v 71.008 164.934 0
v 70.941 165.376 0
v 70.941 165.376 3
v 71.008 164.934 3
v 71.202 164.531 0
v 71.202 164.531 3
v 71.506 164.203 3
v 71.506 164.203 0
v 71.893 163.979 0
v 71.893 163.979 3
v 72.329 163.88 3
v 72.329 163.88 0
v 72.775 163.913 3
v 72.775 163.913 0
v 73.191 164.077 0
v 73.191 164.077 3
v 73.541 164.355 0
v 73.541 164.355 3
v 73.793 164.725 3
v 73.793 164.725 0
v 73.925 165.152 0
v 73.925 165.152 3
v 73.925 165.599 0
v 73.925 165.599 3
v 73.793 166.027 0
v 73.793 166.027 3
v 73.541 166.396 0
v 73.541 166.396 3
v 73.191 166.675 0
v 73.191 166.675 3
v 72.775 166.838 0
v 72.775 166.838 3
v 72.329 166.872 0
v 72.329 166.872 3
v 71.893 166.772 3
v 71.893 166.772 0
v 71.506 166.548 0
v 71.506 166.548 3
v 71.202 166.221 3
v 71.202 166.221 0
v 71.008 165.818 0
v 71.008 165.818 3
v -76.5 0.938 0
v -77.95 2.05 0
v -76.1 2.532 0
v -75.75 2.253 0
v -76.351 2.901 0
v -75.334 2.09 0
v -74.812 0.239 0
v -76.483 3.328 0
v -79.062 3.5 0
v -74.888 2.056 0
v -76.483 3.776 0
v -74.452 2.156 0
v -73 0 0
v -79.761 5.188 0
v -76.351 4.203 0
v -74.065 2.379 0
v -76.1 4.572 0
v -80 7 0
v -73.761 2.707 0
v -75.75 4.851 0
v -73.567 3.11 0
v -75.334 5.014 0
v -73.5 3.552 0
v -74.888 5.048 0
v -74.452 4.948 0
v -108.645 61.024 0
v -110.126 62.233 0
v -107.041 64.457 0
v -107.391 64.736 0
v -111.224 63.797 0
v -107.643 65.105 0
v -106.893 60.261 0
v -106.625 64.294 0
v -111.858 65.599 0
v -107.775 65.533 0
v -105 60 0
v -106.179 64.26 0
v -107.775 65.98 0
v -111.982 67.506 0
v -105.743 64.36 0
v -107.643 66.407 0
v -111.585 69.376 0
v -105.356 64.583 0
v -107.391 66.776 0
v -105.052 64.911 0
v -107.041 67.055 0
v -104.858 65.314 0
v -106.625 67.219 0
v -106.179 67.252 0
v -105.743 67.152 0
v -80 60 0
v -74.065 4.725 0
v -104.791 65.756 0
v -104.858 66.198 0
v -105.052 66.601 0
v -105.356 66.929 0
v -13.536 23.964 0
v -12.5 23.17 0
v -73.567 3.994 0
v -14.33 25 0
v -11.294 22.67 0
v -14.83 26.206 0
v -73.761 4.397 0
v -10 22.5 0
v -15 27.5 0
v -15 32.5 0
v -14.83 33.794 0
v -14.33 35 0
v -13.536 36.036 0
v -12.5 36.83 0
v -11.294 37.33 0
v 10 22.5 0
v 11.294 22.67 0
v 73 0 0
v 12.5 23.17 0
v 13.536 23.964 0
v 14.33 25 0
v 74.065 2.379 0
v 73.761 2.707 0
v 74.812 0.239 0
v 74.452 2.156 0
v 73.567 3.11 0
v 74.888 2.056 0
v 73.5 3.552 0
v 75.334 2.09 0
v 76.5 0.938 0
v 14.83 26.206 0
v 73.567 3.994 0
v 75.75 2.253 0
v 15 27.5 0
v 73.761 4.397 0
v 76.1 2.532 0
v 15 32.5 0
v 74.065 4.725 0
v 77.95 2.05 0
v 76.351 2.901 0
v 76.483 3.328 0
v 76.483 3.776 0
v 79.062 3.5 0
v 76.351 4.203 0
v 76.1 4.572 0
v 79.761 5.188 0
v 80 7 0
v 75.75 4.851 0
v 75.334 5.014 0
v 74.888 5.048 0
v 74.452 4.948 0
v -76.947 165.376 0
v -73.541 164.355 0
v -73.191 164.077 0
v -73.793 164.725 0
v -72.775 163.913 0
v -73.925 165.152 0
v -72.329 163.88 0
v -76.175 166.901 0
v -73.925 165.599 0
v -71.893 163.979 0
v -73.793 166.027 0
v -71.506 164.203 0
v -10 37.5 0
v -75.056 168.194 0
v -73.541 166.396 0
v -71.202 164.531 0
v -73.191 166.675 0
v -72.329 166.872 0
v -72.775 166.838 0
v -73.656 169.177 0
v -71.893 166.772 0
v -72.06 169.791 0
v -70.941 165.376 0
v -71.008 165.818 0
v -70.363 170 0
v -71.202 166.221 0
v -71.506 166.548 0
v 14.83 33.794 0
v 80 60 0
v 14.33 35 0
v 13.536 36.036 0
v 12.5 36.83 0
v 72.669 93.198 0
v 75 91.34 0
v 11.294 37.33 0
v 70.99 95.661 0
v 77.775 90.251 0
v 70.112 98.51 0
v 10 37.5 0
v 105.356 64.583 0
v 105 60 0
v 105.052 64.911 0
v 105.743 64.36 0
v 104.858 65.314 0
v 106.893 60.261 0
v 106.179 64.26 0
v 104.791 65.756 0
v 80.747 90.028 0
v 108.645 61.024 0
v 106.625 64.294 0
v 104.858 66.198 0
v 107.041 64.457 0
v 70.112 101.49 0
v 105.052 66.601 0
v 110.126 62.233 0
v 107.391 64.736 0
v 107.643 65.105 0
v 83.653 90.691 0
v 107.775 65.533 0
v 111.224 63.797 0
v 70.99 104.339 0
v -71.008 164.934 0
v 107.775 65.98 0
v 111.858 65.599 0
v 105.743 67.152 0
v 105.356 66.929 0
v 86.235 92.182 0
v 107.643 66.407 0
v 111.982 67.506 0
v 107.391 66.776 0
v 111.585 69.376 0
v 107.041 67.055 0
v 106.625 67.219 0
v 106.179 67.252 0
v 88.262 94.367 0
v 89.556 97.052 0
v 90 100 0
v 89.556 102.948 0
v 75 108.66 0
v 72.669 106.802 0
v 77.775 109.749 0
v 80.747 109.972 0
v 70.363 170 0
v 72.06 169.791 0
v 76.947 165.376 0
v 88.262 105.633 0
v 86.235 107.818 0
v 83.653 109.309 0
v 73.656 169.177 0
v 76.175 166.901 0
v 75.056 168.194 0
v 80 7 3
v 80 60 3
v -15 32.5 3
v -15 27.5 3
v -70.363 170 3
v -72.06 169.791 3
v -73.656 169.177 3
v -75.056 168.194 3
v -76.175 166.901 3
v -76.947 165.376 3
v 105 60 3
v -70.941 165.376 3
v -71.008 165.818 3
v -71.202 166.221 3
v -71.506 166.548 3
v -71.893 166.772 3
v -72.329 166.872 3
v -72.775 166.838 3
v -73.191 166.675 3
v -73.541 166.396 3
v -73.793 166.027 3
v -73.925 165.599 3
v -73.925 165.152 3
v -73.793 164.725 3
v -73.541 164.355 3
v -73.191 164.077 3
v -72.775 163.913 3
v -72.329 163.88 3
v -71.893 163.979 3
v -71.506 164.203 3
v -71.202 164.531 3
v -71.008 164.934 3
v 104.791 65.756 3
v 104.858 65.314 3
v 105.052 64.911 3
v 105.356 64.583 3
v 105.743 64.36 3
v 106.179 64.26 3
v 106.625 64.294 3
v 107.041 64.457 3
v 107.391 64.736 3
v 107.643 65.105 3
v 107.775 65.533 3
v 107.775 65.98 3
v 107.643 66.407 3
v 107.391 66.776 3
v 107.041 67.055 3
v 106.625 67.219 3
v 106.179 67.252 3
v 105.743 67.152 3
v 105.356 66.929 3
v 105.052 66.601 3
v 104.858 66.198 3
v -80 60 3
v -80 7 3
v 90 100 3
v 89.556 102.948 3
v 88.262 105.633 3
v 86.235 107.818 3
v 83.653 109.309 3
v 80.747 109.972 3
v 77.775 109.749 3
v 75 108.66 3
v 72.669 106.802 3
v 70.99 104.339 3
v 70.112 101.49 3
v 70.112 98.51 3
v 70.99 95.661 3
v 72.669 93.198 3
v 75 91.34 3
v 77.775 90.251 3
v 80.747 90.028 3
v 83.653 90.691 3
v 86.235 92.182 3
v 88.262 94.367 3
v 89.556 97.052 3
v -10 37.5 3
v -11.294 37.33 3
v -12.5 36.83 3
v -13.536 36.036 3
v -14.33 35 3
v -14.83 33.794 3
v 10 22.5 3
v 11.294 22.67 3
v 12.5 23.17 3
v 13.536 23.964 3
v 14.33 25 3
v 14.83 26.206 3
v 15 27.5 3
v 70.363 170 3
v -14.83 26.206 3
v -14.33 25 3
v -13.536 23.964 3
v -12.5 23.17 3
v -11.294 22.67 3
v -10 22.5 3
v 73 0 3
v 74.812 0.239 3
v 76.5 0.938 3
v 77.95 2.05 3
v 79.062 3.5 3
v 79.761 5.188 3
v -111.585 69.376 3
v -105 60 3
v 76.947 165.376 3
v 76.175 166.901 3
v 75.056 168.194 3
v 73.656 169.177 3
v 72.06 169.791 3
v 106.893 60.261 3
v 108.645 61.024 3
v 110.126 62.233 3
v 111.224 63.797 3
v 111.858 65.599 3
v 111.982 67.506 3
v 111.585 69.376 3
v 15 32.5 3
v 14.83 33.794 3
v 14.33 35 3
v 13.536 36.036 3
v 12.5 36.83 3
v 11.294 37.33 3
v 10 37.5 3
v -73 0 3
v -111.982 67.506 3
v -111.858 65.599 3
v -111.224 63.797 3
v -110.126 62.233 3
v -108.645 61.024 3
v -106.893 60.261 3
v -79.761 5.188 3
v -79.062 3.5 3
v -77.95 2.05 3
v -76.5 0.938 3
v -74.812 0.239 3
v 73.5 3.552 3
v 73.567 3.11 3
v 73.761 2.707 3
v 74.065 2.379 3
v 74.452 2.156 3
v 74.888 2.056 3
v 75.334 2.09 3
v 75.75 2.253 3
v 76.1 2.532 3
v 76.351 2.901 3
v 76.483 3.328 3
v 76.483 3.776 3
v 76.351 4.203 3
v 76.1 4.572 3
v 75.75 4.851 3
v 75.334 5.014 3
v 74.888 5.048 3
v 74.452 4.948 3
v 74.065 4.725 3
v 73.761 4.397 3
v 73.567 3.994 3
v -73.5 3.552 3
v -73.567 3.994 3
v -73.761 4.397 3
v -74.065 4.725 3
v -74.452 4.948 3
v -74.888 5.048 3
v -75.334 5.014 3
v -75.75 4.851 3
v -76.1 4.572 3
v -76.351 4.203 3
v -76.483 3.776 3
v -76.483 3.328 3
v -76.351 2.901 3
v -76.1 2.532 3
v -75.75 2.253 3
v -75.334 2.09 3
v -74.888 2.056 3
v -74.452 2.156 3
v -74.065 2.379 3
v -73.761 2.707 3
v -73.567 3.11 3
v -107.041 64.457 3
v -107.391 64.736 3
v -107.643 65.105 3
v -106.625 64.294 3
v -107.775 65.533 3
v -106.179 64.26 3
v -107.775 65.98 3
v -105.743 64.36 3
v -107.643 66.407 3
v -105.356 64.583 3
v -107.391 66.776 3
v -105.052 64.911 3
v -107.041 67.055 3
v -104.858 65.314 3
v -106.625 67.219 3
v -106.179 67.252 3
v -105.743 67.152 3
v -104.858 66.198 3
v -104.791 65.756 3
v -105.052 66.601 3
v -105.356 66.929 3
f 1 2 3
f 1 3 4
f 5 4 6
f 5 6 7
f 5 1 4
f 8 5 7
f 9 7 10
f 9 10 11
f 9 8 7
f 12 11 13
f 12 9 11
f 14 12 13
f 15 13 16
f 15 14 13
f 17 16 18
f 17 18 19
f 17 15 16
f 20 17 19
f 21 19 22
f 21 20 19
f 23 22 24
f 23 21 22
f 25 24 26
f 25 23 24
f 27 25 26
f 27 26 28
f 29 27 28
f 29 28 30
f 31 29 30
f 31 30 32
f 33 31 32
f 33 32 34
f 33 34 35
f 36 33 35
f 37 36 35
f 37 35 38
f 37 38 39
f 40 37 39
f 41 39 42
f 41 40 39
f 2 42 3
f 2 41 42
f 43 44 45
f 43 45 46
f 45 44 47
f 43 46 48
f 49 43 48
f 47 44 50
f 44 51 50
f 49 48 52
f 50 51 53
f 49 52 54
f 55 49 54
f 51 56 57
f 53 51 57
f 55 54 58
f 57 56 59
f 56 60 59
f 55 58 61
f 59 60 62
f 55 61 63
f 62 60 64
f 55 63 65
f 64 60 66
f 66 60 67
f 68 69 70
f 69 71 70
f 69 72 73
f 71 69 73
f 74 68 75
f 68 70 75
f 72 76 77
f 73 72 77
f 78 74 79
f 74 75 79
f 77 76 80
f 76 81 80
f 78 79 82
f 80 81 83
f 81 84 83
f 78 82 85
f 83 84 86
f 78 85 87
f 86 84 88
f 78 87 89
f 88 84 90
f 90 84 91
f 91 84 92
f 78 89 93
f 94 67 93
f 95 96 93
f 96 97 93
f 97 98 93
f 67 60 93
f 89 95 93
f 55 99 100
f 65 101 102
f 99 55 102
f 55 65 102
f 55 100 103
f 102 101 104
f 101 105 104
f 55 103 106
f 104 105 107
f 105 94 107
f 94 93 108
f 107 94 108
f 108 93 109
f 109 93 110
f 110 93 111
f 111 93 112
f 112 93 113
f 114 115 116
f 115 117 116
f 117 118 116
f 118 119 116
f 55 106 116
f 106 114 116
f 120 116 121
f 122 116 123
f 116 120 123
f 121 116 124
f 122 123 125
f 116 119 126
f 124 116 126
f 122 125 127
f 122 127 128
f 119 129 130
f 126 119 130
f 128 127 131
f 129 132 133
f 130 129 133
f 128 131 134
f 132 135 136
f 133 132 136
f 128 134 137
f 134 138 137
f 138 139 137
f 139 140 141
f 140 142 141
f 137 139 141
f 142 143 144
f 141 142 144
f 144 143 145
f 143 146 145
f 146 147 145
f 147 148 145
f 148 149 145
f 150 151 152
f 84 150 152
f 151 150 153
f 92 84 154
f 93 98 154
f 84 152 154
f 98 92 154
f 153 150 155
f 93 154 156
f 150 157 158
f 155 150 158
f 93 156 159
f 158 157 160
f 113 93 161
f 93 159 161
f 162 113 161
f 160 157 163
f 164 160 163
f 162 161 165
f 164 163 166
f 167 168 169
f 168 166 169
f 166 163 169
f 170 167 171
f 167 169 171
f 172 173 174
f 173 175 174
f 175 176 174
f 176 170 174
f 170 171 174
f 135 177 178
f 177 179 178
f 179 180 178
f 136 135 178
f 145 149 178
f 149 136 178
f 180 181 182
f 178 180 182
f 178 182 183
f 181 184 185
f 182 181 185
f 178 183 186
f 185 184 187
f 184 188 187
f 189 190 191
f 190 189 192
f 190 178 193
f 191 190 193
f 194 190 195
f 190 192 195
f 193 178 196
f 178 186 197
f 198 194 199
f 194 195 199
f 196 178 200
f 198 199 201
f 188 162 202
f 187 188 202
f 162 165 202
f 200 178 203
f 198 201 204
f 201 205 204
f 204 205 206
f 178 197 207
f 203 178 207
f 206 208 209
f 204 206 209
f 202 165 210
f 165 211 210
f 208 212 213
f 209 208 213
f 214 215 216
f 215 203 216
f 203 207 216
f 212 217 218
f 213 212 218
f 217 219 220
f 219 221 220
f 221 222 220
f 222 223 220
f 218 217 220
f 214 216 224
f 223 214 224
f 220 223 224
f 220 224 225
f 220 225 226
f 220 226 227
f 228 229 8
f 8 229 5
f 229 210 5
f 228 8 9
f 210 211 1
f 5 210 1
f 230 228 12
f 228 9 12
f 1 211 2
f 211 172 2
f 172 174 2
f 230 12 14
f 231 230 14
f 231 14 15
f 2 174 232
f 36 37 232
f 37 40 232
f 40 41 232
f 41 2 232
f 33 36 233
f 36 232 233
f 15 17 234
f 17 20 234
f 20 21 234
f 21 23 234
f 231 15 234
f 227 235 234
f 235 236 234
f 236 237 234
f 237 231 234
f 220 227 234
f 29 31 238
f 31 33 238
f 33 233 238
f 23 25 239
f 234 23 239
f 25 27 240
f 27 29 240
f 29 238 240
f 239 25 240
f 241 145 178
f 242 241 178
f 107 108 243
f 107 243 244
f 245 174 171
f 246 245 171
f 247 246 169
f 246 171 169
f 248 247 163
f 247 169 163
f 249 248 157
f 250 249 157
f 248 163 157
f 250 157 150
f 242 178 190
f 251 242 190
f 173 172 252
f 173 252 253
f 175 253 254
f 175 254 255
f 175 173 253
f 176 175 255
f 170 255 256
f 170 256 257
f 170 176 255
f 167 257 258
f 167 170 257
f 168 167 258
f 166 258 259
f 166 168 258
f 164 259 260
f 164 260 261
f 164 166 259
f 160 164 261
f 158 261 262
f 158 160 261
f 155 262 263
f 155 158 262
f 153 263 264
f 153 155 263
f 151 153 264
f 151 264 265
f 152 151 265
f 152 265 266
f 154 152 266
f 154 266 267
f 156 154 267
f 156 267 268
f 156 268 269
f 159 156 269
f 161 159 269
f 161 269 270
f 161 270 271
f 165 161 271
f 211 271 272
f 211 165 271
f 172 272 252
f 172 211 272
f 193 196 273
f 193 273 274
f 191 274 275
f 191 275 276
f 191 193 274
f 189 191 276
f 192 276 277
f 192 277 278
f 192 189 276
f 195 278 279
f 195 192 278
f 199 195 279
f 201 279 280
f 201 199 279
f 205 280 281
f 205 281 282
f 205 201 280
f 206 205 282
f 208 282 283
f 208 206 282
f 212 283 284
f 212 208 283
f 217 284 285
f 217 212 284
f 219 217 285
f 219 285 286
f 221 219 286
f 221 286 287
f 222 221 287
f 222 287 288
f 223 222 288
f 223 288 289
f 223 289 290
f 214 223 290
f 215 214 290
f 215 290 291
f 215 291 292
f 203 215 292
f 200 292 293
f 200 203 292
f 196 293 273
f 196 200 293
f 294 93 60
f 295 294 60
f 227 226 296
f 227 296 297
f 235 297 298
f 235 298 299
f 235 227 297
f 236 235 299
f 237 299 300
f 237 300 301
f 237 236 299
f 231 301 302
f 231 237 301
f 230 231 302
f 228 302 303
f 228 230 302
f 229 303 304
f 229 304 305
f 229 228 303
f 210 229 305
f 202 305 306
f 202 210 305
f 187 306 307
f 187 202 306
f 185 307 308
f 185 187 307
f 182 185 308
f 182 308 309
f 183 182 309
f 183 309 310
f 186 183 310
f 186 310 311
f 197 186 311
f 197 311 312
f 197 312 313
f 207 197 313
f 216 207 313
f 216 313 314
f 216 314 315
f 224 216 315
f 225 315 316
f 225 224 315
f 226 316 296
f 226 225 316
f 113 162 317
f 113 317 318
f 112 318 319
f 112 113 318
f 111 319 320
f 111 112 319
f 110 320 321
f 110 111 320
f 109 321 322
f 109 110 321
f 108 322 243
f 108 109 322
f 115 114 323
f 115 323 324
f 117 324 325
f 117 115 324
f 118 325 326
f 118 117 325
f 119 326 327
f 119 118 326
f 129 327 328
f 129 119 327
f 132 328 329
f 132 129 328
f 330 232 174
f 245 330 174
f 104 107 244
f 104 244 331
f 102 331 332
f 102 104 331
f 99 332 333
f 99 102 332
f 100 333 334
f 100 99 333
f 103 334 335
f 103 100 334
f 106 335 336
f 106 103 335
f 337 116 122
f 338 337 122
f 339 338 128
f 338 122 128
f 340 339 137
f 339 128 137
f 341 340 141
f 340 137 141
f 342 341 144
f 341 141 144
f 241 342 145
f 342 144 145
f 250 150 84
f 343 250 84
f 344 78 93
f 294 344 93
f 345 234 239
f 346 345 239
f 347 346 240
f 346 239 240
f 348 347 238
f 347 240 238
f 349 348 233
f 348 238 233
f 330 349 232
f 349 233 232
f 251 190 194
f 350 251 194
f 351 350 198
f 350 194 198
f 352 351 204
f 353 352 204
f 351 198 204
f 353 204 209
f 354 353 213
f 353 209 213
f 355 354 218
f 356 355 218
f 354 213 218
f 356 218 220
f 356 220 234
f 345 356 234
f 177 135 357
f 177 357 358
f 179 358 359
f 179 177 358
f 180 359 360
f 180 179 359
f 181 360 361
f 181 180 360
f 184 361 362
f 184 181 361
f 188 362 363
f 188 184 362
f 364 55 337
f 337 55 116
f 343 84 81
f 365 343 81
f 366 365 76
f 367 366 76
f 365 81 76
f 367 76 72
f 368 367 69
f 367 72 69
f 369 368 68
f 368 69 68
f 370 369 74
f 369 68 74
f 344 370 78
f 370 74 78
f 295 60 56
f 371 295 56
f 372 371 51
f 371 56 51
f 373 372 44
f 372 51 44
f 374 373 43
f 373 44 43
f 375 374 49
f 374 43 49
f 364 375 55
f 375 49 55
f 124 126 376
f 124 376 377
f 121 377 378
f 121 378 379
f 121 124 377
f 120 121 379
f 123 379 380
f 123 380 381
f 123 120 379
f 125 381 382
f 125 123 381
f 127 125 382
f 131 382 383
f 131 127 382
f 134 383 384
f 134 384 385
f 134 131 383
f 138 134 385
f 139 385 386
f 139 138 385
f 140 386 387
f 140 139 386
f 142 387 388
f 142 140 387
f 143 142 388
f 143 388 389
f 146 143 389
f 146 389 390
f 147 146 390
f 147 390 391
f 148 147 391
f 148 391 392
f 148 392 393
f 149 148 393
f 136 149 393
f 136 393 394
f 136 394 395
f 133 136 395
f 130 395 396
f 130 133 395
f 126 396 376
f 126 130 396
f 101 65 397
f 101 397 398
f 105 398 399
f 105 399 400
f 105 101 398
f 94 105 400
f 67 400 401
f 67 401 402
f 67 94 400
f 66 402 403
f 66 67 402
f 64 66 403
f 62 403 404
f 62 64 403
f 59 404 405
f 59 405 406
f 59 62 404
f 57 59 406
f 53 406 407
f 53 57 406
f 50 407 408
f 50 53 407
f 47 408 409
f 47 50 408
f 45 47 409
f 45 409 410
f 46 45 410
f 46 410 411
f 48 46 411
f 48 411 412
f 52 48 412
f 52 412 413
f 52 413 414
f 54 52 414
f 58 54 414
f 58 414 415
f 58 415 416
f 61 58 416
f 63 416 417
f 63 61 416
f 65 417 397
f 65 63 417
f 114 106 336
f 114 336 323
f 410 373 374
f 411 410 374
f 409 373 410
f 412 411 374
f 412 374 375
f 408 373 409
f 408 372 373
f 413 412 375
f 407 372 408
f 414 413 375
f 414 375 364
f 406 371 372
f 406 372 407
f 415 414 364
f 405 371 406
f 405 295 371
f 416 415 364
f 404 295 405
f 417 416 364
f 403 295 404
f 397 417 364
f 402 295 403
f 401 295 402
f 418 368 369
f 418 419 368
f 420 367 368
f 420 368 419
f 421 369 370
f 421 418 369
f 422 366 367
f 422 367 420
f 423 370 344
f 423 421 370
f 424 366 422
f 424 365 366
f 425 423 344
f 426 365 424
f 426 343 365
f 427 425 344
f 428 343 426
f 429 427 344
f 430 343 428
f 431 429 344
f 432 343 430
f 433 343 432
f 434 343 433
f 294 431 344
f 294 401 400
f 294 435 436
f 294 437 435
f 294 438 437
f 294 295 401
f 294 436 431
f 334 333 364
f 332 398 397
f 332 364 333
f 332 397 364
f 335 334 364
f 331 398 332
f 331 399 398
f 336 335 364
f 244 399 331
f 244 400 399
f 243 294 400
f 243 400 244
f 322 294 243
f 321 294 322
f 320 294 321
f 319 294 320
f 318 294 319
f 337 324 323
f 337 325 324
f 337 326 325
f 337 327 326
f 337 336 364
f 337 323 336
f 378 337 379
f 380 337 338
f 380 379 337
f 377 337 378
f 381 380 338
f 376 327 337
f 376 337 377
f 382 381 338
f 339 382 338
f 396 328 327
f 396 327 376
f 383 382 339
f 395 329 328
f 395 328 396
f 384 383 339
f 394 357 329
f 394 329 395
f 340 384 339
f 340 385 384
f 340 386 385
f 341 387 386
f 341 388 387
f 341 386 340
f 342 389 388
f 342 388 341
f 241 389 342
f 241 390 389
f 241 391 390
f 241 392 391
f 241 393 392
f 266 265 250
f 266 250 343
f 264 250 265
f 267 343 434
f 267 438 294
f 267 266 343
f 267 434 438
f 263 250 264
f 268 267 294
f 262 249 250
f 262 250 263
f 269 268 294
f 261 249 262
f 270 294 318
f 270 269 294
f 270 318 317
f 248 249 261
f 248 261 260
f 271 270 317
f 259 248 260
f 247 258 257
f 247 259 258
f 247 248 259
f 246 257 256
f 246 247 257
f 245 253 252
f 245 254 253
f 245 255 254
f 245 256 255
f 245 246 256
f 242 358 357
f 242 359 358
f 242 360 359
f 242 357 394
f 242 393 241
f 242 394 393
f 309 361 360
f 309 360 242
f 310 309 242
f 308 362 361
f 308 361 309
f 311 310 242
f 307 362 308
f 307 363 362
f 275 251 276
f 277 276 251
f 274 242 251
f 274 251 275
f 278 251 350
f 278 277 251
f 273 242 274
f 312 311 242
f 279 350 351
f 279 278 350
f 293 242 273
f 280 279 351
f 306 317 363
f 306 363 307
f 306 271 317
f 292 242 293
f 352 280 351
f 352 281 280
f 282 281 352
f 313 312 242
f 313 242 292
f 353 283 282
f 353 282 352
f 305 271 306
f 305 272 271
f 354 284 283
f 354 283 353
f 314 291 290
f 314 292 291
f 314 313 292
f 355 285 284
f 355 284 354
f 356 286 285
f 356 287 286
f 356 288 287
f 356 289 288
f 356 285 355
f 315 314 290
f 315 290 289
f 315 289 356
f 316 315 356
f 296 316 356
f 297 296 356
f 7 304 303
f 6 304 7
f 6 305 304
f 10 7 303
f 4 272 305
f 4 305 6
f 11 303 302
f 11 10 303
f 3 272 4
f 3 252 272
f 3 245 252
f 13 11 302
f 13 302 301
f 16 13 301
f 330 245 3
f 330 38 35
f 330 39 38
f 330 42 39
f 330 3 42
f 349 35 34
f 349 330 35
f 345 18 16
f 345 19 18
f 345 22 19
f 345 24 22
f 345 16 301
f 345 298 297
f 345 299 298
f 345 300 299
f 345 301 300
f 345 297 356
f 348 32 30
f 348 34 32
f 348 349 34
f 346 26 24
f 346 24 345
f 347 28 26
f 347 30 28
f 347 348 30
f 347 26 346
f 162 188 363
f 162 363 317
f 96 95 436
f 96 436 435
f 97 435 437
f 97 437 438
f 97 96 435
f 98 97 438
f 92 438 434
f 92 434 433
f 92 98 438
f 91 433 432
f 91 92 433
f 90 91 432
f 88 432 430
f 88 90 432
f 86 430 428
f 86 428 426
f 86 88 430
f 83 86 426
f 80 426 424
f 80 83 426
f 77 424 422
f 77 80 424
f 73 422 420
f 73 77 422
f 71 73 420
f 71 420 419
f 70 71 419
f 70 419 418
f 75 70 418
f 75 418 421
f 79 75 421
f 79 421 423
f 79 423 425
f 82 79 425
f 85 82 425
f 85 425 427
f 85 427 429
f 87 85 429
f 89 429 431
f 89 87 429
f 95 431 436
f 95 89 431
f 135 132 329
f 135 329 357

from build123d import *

# Parameters (mm, degrees)
SKETCH_2_R      = 10
SKETCH_2_R_2    = 1.5
EXTRUDE_2_DEPTH = 3


with BuildPart() as part:
    # 草图2 → 凸台-拉伸2 (new body)
    with BuildSketch(Plane.XY):
        with BuildLine():
            Line((-73, 0), (73, 0))
            ThreePointArc((73, 0), (77.949747468, 2.050252532), (80, 7))
            Line((80, 7), (80, 60))
            Line((80, 60), (105, 60))
            ThreePointArc((105, 60), (110.7284389, 62.976942983), (111.584524662, 69.375717782))
            Line((111.584524662, 69.375717782), (76.947414353, 165.375717782))
            ThreePointArc((76.947414353, 165.375717782), (74.385946708, 168.7284389), (70.362889691, 170))
            Line((70.362889691, 170), (-70.362889691, 170))
            ThreePointArc((-70.362889691, 170), (-74.385946708, 168.7284389), (-76.947414353, 165.375717782))
            Line((-76.947414353, 165.375717782), (-111.584524662, 69.375717782))
            ThreePointArc((-111.584524662, 69.375717782), (-110.7284389, 62.976942983), (-105, 60))
            Line((-105, 60), (-80, 60))
            Line((-80, 60), (-80, 7))
            ThreePointArc((-80, 7), (-77.949747468, 2.050252532), (-73, 0))
        make_face()
        with Locations((80, 100)):
            Circle(SKETCH_2_R, mode=Mode.SUBTRACT)
        with Locations((-72.441382232, 165.375717782)):
            Circle(SKETCH_2_R_2, mode=Mode.SUBTRACT)
        with Locations((-106.29148568, 65.75613767)):
            Circle(SKETCH_2_R_2, mode=Mode.SUBTRACT)
        with Locations(Location((106.29148568, 65.75613767, 0), (0, 0, 180))):
            Circle(SKETCH_2_R_2, mode=Mode.SUBTRACT)
        with Locations(Location((72.441382232, 165.375717782, 0), (0, 0, 180))):
            Circle(SKETCH_2_R_2, mode=Mode.SUBTRACT)
        with Locations((-75, 3.552033702)):
            Circle(SKETCH_2_R_2, mode=Mode.SUBTRACT)
        with Locations(Location((75, 3.552033702, 0), (0, 0, 180))):
            Circle(SKETCH_2_R_2, mode=Mode.SUBTRACT)
        with BuildLine():
            Line((-10, 22.5), (10, 22.5))
            ThreePointArc((10, 22.5), (13.535533906, 23.964466094), (15, 27.5))
            Line((15, 27.5), (15, 32.5))
            ThreePointArc((15, 32.5), (13.535533906, 36.035533906), (10, 37.5))
            Line((10, 37.5), (-10, 37.5))
            ThreePointArc((-10, 37.5), (-13.535533906, 36.035533906), (-15, 32.5))
            Line((-15, 32.5), (-15, 27.5))
            ThreePointArc((-15, 27.5), (-13.535533906, 23.964466094), (-10, 22.5))
        make_face(mode=Mode.SUBTRACT)
    extrude(amount=EXTRUDE_2_DEPTH)


solid = part.part
